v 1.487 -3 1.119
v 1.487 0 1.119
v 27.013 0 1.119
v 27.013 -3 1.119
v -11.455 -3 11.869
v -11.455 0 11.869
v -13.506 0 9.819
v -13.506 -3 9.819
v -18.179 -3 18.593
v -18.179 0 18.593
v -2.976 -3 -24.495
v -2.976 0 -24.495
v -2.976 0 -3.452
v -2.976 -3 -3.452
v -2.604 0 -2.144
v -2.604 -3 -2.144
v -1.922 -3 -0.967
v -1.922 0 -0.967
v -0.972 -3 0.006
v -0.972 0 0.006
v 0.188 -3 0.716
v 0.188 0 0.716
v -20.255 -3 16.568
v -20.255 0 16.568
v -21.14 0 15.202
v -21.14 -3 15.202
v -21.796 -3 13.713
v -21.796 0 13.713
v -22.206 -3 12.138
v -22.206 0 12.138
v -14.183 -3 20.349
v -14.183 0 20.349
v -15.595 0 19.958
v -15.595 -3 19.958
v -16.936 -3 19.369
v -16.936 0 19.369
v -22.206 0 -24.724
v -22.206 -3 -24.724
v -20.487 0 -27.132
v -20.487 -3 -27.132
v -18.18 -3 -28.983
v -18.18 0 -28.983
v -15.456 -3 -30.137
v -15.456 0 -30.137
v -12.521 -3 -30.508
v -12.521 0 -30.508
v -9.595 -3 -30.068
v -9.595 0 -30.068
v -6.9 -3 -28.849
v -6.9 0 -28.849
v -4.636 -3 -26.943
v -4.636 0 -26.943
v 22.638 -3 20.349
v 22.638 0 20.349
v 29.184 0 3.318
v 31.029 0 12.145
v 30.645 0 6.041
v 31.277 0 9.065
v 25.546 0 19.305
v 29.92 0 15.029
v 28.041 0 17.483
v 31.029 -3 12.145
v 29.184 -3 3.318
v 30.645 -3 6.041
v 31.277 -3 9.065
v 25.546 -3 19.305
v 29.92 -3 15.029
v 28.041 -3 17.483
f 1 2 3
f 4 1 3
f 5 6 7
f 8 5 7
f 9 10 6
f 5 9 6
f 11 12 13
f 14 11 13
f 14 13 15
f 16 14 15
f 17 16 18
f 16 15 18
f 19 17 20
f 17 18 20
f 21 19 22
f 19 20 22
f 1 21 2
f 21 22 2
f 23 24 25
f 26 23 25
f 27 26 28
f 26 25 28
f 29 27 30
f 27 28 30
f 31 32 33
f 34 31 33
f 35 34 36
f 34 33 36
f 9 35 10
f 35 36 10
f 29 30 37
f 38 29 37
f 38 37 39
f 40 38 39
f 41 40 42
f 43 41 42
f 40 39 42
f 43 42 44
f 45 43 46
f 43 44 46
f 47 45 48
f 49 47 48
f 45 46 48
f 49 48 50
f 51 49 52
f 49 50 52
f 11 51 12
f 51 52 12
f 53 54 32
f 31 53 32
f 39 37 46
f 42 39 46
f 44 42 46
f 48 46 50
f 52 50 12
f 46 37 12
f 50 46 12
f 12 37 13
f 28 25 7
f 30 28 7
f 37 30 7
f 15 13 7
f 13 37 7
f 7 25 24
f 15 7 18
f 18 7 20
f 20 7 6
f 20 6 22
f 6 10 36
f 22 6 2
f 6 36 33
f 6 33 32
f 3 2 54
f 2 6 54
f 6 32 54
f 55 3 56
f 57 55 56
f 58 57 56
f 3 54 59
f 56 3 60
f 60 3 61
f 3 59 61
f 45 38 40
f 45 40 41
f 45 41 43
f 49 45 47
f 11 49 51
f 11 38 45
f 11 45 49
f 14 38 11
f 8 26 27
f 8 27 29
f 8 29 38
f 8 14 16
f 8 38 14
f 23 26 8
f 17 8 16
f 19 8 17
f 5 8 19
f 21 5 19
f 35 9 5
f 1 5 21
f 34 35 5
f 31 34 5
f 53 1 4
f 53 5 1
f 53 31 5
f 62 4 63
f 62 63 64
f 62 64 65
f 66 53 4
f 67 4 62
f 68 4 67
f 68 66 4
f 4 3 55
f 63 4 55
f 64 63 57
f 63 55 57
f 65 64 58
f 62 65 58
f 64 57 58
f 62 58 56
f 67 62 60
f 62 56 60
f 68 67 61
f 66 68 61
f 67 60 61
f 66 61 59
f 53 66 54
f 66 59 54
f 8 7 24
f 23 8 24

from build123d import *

# Parameters (mm, degrees)
F1_DEPTH = 3


with BuildPart() as f1:
    # F0 (on Front) → F1 (new body)
    with BuildSketch(Plane.XZ):
        with BuildLine():
            Line((-2.976018237, -3.4522186304), (-2.976018237, -0.7112144958))
            Line((-2.976018237, -0.7112144958), (-4.8061137058, 1.118880973))
            Line((-4.8061137058, 1.118880973), (-22.2056694329, 1.118880973))
            Line((-22.2056694329, 1.118880973), (-22.2056694329, -24.7238390148))
            ThreePointArc((-22.2056694329, -24.7238390148), (-12.5206211591, -30.5080748055), (-2.976018237, -24.494914338))
            Line((-2.976018237, -24.494914338), (-2.976018237, -5.1255999133))
            ThreePointArc((-2.976018237, -5.1255999133), (-3.0401081093, -4.2889092718), (-2.9760182369, -3.4522186304))
        make_face()
        with BuildLine():
            Line((-22.2056694329, 1.118880973), (-13.5058912988, 9.818658566))
            Line((-13.5058912988, 9.818658566), (-20.2551439519, 16.5679112191))
            ThreePointArc((-20.2551439519, 16.5679112191), (-21.4976121103, 14.4704948921), (-22.2056694329, 12.1377846226))
            Line((-22.2056694329, 12.1377846226), (-22.2056694329, 1.118880973))
        make_face()
        Polygon((-2.976018237, 3.3900048351), (-2.976018237, 20.348530973), (-11.4552815696, 11.8692681677), align=None)
        Polygon((-4.8061137058, 1.118880973), (-13.5058912988, 9.818658566), (-22.2056694329, 1.118880973), align=None)
        with BuildLine():
            Line((22.6377740155, 20.348530973), (-2.976018237, 20.348530973))
            Line((-2.976018237, 20.348530973), (-2.976018237, 3.3900048351))
            Line((-2.976018237, 3.3900048351), (-0.7048943749, 1.118880973))
            Line((-0.7048943749, 1.118880973), (1.486654611, 1.118880973))
            ThreePointArc((1.486654611, 1.118880973), (2.4534177425, 1.20461658), (3.4201808739, 1.118880973))
            Line((3.4201808739, 1.118880973), (27.0130801946, 1.118880973))
            ThreePointArc((27.0130801946, 1.118880973), (31.028528745, 12.1450925003), (22.6377740155, 20.348530973))
        make_face()
        with BuildLine():
            Line((-2.976018237, 20.348530973), (-14.1827978541, 20.348530973))
            ThreePointArc((-14.1827978541, 20.348530973), (-16.2761490838, 19.6875478868), (-18.179069268, 18.5930558661))
            Line((-18.179069268, 18.5930558661), (-11.4552815696, 11.8692681677))
            Line((-11.4552815696, 11.8692681677), (-2.976018237, 20.348530973))
        make_face()
        Polygon((-2.976018237, 1.118880973), (-2.976018237, 3.3900048351), (-11.4552815696, 11.8692681677), (-13.5058912988, 9.818658566), (-4.8061137058, 1.118880973), align=None)
        Polygon((-2.976018237, -0.7112144958), (-2.976018237, 1.118880973), (-4.8061137058, 1.118880973), align=None)
        with BuildLine():
            Line((-0.7048943749, 1.118880973), (-2.976018237, 1.118880973))
            Line((-2.976018237, 1.118880973), (-2.976018237, -0.7112144958))
            Line((-2.976018237, -0.7112144958), (-2.976018237, -3.4522186304))
            ThreePointArc((-2.9760182369, -3.4522186304), (-1.4774318683, -0.4512996484), (1.486654611, 1.118880973))
            Line((1.486654611, 1.118880973), (-0.7048943749, 1.118880973))
        make_face()
        Polygon((-0.7048943749, 1.118880973), (-2.976018237, 3.3900048351), (-2.976018237, 1.118880973), align=None)
        with BuildLine():
            Line((-2.976018237, -5.1255999133), (-2.976018237, -3.4522186304))
            ThreePointArc((-2.9760182369, -3.4522186304), (-3.0401081093, -4.2889092718), (-2.976018237, -5.1255999133))
        make_face()
        with BuildLine():
            ThreePointArc((3.4201808739, 1.118880973), (2.4534177425, 1.20461658), (1.486654611, 1.118880973))
            Line((1.486654611, 1.118880973), (3.4201808739, 1.118880973))
        make_face()
    extrude(amount=F1_DEPTH)


solid = f1.part
